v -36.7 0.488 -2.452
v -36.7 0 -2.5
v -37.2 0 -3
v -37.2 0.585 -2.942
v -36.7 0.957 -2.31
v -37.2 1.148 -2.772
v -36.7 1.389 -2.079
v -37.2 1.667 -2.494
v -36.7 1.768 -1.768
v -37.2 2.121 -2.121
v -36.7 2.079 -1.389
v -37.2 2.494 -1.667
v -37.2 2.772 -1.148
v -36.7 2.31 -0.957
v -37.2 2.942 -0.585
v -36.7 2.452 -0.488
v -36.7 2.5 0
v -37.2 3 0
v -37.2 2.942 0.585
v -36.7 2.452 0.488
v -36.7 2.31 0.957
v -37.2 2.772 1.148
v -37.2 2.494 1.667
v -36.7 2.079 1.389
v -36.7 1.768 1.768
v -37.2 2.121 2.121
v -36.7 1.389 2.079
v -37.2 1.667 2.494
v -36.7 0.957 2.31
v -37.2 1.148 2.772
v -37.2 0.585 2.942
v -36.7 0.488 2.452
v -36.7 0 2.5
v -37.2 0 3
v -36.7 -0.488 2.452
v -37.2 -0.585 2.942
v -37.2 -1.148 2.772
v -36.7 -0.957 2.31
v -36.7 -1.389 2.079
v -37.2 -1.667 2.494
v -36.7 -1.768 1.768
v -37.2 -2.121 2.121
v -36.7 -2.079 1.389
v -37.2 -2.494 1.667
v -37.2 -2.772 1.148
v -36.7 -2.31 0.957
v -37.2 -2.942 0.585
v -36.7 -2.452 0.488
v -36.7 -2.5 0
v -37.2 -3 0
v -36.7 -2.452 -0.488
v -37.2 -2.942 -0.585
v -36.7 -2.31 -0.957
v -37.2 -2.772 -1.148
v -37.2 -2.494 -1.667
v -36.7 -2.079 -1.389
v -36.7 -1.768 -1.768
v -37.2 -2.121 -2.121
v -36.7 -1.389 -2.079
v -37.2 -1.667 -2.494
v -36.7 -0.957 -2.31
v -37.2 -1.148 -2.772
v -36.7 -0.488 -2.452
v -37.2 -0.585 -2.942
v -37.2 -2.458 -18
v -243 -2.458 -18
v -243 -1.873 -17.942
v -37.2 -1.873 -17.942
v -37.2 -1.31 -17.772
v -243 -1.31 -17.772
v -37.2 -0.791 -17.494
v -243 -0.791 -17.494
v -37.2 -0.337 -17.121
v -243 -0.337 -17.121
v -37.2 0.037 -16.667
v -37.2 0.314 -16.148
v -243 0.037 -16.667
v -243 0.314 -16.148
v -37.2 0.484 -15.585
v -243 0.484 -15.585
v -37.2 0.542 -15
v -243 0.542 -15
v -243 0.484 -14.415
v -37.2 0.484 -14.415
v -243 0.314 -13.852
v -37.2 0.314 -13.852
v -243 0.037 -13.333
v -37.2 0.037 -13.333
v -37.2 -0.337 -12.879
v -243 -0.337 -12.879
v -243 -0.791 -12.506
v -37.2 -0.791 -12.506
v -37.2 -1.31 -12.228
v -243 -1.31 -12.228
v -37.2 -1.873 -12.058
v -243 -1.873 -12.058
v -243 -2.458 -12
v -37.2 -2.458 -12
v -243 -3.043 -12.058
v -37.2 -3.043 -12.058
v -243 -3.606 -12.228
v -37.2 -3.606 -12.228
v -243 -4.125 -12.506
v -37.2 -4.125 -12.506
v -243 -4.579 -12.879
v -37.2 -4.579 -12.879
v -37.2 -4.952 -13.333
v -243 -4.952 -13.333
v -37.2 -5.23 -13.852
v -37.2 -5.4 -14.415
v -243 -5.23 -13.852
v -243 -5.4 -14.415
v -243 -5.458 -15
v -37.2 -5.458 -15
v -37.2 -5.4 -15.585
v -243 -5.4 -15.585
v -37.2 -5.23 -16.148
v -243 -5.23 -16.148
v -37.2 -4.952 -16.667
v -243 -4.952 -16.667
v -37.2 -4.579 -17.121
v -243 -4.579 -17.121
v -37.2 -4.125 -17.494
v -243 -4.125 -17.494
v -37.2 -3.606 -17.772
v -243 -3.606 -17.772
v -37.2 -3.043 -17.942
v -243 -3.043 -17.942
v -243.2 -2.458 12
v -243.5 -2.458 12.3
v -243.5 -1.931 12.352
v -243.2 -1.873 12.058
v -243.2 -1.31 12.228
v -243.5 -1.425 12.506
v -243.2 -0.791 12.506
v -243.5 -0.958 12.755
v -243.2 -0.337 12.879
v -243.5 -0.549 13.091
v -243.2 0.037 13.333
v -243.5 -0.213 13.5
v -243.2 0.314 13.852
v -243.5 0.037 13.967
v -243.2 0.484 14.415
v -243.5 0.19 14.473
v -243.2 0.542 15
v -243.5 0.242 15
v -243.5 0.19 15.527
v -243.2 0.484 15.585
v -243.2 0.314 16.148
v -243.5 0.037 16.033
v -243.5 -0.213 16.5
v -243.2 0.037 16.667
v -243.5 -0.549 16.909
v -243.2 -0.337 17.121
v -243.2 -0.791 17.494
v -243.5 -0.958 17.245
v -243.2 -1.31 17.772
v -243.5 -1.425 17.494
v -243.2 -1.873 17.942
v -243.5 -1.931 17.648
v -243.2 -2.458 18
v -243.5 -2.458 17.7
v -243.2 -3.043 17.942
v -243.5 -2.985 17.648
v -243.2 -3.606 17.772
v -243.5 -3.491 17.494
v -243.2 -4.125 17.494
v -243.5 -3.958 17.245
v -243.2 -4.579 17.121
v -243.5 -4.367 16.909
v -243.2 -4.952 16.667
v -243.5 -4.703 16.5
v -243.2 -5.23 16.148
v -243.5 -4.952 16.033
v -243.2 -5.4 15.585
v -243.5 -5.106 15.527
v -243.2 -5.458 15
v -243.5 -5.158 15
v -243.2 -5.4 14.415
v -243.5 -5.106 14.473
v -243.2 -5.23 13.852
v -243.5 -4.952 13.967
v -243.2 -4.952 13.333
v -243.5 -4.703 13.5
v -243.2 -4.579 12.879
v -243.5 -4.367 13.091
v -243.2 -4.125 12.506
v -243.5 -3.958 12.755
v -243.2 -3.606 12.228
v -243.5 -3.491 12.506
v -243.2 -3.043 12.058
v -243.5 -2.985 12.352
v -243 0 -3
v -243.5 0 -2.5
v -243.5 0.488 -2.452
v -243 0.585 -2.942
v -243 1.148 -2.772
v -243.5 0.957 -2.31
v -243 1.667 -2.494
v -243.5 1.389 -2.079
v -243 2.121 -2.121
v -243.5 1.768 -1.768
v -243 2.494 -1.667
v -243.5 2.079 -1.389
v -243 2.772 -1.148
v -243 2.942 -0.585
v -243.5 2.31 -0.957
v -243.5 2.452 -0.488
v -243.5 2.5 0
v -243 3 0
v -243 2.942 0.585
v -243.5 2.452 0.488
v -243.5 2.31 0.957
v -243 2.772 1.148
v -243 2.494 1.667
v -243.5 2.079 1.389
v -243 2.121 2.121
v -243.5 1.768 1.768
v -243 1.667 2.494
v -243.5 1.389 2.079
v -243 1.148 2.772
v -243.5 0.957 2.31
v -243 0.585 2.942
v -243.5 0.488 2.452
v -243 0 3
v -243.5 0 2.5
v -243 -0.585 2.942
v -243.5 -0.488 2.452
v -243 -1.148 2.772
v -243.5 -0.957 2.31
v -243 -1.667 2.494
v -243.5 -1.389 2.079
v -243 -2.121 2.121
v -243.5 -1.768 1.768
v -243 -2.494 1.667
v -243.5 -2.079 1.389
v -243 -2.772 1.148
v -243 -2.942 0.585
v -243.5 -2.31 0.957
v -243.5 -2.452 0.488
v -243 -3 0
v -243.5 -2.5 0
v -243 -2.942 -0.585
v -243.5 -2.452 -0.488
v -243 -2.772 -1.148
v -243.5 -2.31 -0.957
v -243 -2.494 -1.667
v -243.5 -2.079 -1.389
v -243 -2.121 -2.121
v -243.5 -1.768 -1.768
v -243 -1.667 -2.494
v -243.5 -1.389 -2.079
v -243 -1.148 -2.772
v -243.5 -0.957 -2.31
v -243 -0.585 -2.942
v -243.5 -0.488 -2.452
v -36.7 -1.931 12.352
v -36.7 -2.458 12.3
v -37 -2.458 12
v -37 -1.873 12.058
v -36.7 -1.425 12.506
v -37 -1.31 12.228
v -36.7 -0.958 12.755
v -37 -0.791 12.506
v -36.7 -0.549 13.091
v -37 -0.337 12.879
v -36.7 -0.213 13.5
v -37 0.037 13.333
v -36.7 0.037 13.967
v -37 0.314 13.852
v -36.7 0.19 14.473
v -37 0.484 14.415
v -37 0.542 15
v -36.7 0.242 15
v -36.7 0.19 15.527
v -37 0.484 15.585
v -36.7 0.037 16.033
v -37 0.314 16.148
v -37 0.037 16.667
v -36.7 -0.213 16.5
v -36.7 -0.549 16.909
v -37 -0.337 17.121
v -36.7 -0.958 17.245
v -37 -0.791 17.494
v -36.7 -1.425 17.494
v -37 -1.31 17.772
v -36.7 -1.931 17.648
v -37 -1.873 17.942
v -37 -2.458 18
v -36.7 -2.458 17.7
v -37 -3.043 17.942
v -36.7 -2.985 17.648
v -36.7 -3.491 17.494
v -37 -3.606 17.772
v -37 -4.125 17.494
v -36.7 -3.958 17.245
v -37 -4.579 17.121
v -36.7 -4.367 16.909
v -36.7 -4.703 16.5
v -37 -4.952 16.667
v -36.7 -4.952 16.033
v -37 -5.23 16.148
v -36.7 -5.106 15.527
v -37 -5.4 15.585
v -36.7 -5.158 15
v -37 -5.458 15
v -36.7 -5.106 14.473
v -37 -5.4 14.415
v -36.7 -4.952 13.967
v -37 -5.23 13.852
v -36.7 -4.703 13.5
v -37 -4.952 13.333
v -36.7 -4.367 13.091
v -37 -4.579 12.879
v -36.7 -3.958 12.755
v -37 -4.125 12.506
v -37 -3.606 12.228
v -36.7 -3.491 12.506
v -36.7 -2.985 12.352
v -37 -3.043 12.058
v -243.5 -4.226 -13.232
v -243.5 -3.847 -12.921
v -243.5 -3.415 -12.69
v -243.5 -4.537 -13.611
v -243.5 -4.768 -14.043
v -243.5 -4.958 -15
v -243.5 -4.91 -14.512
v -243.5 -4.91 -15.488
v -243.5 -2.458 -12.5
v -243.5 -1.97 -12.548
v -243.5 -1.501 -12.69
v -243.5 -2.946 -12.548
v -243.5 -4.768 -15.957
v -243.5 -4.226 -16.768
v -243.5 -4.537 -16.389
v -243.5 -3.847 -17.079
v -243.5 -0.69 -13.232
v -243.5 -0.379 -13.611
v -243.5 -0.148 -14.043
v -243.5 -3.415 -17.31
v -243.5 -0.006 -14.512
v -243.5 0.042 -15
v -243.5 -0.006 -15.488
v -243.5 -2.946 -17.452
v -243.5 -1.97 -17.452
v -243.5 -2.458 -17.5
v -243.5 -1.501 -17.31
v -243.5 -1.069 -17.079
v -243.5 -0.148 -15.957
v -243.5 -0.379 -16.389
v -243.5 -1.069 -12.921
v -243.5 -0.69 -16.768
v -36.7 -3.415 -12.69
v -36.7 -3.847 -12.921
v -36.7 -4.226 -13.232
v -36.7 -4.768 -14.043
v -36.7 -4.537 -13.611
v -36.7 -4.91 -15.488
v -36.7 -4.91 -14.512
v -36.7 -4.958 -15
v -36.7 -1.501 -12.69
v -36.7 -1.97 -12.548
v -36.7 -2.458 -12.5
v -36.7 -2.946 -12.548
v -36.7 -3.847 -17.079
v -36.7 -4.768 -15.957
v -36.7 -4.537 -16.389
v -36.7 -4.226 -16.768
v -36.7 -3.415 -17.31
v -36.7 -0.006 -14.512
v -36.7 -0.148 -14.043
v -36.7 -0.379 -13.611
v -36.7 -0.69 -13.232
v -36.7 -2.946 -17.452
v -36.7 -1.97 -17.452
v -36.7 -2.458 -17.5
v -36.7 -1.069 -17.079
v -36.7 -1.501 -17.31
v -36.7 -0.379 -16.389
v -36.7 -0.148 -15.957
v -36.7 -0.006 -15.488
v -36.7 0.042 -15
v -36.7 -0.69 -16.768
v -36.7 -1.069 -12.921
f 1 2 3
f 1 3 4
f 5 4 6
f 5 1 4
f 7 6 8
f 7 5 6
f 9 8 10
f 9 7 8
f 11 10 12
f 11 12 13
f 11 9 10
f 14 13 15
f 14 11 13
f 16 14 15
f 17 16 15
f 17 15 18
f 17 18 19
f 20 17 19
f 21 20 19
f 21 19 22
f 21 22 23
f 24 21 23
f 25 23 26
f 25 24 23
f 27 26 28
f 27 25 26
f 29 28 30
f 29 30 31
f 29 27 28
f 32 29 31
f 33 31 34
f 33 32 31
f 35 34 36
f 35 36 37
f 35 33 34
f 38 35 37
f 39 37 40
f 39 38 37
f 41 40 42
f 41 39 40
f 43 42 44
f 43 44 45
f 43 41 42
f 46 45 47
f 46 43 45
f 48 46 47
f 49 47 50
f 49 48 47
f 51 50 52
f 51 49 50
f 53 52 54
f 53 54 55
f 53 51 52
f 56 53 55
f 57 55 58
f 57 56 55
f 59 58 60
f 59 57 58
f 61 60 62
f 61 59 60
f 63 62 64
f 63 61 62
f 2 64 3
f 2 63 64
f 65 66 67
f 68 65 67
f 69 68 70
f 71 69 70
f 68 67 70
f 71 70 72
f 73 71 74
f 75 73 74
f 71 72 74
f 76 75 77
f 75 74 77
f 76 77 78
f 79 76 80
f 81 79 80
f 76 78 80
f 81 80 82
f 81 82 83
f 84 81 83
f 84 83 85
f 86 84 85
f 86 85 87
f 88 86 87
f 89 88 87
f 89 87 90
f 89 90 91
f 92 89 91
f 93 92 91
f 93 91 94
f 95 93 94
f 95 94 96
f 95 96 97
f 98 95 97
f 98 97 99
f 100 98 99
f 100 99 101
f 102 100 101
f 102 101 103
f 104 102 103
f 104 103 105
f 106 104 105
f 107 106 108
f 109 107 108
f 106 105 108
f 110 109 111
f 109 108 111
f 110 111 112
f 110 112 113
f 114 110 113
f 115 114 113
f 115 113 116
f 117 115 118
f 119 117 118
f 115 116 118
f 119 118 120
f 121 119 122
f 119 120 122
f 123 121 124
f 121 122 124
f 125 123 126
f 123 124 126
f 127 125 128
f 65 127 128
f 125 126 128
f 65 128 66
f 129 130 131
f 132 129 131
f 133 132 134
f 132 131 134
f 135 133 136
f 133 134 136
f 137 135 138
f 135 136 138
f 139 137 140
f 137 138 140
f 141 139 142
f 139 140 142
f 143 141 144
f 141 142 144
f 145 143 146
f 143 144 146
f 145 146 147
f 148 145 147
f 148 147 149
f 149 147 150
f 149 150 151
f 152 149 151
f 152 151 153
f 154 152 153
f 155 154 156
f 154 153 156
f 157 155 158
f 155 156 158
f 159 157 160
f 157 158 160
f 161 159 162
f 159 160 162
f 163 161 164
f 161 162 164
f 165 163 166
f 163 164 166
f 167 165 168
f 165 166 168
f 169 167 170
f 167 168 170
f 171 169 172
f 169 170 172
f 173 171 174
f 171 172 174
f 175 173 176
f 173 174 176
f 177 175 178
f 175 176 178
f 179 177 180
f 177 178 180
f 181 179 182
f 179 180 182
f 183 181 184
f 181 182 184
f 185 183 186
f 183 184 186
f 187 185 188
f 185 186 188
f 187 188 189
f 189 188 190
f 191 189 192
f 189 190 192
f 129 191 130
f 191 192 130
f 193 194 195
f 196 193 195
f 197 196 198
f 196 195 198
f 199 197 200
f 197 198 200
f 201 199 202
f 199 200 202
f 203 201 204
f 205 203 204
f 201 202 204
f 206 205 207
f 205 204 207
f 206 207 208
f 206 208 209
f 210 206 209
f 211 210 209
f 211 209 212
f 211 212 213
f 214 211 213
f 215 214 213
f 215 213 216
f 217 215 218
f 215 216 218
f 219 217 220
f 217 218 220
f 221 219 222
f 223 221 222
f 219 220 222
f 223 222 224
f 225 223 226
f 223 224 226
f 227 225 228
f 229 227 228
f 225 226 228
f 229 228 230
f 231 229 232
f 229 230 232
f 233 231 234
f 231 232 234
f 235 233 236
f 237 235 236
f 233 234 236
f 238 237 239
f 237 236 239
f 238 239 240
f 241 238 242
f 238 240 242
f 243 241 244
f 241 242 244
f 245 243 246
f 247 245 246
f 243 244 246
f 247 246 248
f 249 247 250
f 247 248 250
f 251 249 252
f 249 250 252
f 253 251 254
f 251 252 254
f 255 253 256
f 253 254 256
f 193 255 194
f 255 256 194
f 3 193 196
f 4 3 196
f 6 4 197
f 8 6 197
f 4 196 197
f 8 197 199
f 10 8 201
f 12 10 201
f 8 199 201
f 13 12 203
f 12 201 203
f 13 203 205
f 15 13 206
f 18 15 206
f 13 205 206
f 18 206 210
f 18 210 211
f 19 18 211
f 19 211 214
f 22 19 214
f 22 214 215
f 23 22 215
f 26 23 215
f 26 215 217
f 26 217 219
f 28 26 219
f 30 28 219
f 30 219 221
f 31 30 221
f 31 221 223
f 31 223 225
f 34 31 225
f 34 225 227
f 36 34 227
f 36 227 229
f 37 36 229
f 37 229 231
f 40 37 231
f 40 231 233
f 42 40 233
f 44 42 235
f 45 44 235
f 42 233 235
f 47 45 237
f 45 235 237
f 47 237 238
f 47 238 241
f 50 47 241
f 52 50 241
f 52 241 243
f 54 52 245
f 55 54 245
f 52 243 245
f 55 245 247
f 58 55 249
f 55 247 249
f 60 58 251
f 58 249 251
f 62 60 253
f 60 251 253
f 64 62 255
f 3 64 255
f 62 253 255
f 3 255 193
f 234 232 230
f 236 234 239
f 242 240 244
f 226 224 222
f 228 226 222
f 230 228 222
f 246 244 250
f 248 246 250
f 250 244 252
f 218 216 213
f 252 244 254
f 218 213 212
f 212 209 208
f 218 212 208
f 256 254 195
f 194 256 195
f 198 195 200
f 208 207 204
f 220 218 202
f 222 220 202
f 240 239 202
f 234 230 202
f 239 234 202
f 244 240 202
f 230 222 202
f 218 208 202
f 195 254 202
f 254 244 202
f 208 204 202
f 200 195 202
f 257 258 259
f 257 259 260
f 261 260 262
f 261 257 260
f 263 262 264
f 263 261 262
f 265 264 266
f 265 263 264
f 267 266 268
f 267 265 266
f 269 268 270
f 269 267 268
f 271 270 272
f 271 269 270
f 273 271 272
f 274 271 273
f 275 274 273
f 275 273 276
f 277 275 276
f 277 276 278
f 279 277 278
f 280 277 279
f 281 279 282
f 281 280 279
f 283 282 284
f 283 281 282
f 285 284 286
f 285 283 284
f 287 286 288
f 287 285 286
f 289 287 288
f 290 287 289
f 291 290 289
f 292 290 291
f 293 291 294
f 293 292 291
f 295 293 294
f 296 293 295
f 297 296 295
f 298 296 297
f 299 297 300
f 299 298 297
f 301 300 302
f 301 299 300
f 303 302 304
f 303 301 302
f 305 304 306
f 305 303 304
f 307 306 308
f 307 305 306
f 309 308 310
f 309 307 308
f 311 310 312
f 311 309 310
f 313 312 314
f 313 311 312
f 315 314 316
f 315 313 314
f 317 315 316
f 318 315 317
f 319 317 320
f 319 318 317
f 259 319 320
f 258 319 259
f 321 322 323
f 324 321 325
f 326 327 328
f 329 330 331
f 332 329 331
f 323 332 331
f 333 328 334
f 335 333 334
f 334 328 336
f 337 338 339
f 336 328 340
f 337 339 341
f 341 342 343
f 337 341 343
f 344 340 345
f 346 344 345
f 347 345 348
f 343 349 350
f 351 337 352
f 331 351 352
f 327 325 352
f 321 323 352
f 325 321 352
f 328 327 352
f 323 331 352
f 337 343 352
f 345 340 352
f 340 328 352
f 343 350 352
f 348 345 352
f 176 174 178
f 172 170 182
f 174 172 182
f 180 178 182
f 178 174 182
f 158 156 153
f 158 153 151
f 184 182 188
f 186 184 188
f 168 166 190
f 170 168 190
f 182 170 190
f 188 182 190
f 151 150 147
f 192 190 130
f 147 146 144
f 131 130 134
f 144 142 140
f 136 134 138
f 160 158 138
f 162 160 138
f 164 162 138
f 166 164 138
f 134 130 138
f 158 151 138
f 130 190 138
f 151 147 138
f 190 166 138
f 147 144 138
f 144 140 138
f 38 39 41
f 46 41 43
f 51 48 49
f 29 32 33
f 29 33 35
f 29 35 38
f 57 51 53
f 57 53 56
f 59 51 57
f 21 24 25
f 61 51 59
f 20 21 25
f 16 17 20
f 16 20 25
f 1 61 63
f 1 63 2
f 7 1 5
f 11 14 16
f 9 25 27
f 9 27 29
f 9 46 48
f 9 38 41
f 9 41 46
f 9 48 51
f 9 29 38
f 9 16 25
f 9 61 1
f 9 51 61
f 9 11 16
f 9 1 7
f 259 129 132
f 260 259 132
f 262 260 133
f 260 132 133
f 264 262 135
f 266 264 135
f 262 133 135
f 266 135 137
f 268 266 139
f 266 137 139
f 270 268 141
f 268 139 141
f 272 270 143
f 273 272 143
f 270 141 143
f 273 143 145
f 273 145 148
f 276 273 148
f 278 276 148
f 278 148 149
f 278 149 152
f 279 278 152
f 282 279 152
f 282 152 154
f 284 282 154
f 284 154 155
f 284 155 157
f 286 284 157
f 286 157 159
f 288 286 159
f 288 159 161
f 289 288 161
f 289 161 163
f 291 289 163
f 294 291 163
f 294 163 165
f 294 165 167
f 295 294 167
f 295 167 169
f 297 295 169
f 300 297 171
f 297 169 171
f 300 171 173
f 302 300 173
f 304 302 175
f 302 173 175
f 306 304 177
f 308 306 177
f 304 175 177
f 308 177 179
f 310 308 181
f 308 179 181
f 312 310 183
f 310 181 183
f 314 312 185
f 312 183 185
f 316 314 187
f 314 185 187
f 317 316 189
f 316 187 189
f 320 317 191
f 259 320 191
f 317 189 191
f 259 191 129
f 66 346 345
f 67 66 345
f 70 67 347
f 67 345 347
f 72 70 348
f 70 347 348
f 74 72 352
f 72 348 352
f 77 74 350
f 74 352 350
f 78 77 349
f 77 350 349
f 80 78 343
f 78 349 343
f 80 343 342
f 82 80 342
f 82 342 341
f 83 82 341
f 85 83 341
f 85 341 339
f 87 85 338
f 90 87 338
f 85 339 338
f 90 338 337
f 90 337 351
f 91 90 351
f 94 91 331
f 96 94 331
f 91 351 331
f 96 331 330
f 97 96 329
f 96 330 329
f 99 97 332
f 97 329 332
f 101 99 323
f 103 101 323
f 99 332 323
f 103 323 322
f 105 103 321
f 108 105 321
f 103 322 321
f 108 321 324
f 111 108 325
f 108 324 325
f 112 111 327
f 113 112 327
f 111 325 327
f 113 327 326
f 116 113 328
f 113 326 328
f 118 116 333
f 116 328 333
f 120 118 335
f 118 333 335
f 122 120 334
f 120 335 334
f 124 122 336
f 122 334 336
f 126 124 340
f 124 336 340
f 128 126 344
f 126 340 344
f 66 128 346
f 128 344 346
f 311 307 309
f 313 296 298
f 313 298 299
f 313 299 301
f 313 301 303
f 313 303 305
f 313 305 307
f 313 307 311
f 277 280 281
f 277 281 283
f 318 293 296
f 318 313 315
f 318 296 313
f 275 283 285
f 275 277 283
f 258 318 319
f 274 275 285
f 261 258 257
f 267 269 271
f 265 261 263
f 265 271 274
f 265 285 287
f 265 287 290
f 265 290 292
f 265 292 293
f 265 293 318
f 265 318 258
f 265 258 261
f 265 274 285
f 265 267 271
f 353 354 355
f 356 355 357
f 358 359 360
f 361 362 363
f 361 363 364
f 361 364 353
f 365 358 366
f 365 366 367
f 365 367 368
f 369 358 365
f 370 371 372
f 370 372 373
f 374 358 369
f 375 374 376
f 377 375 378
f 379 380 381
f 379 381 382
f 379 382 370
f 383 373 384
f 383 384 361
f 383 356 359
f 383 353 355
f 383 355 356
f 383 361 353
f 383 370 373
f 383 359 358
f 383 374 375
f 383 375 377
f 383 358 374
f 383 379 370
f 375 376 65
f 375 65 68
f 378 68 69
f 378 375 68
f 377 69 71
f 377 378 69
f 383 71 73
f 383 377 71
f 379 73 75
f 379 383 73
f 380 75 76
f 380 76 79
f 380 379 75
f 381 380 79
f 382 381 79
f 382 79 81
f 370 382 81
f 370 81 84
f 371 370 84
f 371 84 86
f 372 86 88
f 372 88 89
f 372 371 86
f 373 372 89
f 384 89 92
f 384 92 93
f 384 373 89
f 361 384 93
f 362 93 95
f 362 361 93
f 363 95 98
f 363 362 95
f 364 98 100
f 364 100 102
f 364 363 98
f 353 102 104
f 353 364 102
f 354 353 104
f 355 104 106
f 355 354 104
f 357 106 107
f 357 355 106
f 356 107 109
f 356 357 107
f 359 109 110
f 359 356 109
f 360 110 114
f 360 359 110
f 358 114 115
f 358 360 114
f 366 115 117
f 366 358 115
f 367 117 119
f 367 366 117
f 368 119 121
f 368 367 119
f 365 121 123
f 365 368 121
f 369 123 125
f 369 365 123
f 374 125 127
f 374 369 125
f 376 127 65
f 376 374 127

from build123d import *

# Parameters (mm, degrees)
BOSS_EXTRUDE1_START   = -36.7
SKETCH2_R             = 3
BOSS_EXTRUDE1_DEPTH   = 103.4
BOSS_EXTRUDE1_2_DEPTH = 103.4
BOSS_EXTRUDE1_3_DEPTH = 103.4
CHAMFER1_SIZE         = 0.3
CHAMFER2_SIZE         = 0.5
CHAMFER3_SIZE         = 0.5


with BuildPart() as part:
    # Sketch2 → Boss-Extrude1 (new body)
    with BuildSketch(Plane(origin=(0, 0, 0), x_dir=(0, 0, -1), z_dir=(1, 0, 0)).offset(BOSS_EXTRUDE1_START)):
        with Locations((15, -2.457885097)):
            Circle(SKETCH2_R)
    extrude(amount=-BOSS_EXTRUDE1_DEPTH)

    # Chamfer3
    chamfer3_edges = [part.edges().sort_by_distance(p)[0] for p in [
        (-36.7, -2.457885097, -12),
    ]]
    chamfer(chamfer3_edges, length=CHAMFER3_SIZE)

    # Mirror9 3: part across plane


with BuildPart() as body_2:
    # Sketch2 → Boss-Extrude1 2 (new body)
    with BuildSketch(Plane(origin=(0, 0, 0), x_dir=(0, 0, -1), z_dir=(1, 0, 0)).offset(BOSS_EXTRUDE1_START)):
        with Locations((-15, -2.457885097)):
            Circle(SKETCH2_R)
    extrude(amount=-BOSS_EXTRUDE1_2_DEPTH)

    # Chamfer1
    chamfer1_edges = [body_2.edges().sort_by_distance(p)[0] for p in [
        (-36.7, -2.457885097, 18),
    ]]
    chamfer(chamfer1_edges, length=CHAMFER1_SIZE)

    # Mirror9 2: body 2 across plane


with BuildPart() as body_3:
    # Sketch2 → Boss-Extrude1 3 (new body)
    with BuildSketch(Plane(origin=(0, 0, 0), x_dir=(0, 0, -1), z_dir=(1, 0, 0)).offset(BOSS_EXTRUDE1_START)):
        Circle(SKETCH2_R)
    extrude(amount=-BOSS_EXTRUDE1_3_DEPTH)

    # Chamfer2
    chamfer2_edges = [body_3.edges().sort_by_distance(p)[0] for p in [
        (-36.7, 0, 3),
    ]]
    chamfer(chamfer2_edges, length=CHAMFER2_SIZE)

    # Mirror9: body 3 across plane


with BuildPart() as body_3_1:
    add(body_3.part)
    add(body_3.part.mirror(Plane(origin=(-140.1, 0, 0), x_dir=(0, 0, 1), z_dir=(1, 0, 0))))


with BuildPart() as body_2_1:
    add(body_2.part)
    add(body_2.part.mirror(Plane(origin=(-140.1, 0, 0), x_dir=(0, 0, 1), z_dir=(1, 0, 0))))


with BuildPart() as part_1:
    add(part.part)
    add(part.part.mirror(Plane(origin=(-140.1, 0, 0), x_dir=(0, 0, 1), z_dir=(1, 0, 0))))


solid = Compound([body_3_1.part, body_2_1.part, part_1.part])
